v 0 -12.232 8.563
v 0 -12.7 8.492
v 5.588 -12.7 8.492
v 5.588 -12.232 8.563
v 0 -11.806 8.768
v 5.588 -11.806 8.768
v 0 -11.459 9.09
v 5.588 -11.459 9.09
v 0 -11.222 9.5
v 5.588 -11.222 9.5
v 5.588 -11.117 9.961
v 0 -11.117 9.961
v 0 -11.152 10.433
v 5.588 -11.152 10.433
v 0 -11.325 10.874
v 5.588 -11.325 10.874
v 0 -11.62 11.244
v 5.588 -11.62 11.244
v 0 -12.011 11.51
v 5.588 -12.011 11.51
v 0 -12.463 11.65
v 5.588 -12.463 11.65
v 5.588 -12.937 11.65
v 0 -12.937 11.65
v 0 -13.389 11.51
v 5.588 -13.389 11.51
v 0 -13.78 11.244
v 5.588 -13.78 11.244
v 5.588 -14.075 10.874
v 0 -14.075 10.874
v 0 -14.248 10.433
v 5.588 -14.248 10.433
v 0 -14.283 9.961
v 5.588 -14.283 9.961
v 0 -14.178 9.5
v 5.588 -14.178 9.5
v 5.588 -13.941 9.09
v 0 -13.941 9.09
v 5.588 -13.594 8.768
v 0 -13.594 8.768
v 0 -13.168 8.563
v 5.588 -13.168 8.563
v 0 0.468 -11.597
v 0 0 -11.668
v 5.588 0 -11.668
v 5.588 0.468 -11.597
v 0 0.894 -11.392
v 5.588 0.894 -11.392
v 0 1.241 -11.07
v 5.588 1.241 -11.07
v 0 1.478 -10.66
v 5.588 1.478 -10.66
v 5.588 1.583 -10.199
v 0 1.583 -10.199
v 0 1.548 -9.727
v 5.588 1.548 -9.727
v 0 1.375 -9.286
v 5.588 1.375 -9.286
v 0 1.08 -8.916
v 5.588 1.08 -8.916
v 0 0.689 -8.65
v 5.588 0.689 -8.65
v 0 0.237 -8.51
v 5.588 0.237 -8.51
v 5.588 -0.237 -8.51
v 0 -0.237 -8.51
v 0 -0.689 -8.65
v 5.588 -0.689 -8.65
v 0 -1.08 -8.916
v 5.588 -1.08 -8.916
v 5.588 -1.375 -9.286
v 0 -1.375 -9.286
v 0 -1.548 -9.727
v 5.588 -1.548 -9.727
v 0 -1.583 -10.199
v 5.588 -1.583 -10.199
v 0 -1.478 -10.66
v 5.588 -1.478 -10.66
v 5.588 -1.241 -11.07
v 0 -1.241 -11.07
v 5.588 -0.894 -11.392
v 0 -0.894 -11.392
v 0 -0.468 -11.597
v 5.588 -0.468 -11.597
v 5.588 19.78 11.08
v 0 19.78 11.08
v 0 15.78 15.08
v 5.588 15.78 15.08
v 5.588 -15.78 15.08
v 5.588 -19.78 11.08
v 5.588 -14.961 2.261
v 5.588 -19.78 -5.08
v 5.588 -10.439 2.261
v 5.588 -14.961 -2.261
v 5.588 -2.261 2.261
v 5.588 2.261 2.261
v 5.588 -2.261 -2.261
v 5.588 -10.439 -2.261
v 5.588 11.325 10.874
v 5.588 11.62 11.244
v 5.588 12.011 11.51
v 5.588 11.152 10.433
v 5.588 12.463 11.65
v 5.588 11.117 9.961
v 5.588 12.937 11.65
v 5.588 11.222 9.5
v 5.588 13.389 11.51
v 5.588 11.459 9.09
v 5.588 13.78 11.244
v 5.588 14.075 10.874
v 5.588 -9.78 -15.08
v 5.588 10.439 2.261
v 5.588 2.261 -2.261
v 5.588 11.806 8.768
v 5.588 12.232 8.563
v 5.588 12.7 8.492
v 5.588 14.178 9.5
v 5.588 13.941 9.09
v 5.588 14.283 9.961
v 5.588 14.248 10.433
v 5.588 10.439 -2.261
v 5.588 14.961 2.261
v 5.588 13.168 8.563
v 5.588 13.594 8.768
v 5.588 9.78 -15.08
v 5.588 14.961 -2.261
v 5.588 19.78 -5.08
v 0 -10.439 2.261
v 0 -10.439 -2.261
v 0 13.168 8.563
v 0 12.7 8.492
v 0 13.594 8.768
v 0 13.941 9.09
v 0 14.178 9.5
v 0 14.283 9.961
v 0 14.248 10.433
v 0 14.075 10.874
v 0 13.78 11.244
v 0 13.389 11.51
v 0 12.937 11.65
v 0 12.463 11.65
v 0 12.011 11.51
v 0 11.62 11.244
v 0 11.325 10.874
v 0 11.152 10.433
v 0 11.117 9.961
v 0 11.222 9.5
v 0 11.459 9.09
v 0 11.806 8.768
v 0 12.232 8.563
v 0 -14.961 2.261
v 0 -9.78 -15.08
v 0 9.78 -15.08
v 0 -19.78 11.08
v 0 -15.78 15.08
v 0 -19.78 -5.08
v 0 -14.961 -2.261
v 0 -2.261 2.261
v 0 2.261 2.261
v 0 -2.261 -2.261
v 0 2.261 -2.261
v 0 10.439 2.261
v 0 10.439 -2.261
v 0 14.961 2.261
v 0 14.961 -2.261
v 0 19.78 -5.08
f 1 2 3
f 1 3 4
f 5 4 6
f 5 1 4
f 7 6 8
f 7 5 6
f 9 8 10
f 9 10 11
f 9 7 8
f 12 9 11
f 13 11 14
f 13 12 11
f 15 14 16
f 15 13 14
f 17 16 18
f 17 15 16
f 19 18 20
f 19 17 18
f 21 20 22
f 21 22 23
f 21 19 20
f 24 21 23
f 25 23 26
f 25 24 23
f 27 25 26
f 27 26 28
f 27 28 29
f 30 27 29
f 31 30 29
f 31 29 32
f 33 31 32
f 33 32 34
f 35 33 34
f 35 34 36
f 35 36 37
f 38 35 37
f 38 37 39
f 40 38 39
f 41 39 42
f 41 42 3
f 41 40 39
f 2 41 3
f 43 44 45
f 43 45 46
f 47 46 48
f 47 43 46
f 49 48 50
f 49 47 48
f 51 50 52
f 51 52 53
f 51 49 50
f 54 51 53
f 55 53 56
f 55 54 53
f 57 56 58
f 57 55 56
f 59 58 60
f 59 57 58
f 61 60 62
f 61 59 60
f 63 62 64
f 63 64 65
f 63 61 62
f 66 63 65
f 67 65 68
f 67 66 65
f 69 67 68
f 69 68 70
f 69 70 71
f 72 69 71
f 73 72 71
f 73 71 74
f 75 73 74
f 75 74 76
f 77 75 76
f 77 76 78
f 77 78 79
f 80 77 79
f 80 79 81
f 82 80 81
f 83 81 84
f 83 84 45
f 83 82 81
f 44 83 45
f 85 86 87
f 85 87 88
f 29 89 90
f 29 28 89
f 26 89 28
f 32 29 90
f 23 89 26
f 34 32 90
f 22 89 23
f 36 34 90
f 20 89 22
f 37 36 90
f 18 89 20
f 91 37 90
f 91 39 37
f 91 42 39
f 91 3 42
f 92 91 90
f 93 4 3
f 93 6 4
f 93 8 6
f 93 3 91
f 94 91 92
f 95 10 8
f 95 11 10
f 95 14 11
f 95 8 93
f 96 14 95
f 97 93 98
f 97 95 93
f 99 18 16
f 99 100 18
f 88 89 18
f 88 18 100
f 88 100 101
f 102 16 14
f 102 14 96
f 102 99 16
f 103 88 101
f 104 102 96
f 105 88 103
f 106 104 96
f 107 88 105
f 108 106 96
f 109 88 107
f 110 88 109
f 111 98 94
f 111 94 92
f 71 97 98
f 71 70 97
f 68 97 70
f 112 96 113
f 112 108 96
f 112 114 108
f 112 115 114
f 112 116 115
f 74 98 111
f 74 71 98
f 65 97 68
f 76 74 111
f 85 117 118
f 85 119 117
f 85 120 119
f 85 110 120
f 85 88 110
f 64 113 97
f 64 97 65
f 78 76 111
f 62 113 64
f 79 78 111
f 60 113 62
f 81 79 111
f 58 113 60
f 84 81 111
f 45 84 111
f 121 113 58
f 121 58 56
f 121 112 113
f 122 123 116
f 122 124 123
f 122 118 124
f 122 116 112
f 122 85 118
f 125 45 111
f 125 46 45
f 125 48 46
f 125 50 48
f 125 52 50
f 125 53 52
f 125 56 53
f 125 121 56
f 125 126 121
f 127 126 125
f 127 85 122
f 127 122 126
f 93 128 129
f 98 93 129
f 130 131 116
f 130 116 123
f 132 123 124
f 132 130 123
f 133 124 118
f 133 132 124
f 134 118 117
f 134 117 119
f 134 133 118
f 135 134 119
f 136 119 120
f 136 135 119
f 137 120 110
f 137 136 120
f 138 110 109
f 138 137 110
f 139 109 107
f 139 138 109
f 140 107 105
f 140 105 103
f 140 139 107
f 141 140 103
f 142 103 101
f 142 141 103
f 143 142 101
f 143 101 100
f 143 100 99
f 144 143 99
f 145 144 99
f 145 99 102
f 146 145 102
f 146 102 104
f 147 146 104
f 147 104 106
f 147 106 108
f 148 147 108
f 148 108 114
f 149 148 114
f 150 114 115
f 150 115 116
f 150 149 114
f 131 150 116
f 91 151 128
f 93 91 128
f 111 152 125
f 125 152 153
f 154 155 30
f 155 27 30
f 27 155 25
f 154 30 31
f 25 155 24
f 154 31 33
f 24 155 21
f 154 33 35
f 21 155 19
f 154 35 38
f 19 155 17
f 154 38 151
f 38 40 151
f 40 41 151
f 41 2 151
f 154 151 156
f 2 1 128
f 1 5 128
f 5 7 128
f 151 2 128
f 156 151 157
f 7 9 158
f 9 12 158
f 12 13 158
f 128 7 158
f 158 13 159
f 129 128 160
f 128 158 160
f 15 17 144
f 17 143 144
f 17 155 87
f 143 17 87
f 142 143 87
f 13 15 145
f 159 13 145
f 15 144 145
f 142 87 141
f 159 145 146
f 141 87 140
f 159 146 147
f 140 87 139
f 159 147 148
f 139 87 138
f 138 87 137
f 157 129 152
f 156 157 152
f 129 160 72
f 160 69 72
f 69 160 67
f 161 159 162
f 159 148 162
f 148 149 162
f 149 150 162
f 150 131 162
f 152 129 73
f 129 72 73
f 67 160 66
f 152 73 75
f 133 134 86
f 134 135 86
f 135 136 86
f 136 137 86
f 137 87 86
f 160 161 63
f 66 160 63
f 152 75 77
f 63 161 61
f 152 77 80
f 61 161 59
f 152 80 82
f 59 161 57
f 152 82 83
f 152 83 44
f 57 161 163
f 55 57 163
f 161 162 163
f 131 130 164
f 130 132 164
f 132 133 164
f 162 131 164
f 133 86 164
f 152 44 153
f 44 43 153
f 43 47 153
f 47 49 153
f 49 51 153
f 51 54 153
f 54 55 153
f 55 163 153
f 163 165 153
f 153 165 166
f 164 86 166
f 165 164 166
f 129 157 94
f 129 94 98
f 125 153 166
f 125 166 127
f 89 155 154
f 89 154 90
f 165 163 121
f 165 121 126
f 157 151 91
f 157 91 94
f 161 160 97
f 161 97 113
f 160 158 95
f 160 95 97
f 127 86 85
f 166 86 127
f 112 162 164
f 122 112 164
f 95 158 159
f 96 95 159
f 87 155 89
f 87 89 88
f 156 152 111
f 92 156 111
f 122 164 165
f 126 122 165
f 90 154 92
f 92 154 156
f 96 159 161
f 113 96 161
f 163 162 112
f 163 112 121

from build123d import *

# Parameters (mm, degrees)
SKETCH1_W           = 30.16
SKETCH1_H           = 39.56
SKETCH1_R           = 1.5875
SKETCH1_W_2         = 4.521190227
SKETCH1_H_2         = 4.521190227
SKETCH1_W_3         = 4.521190228
SKETCH1_H_3         = 4.521190228
BOSS_EXTRUDE1_DEPTH = 5.588
CHAMFER1_SIZE       = 10
CHAMFER2_SIZE       = 4


with BuildPart() as part:
    # Sketch1 → Boss-Extrude1 (new body)
    with BuildSketch(Plane(origin=(0, 0, 0), x_dir=(0, 0, -1), z_dir=(1, 0, 0))):
        with Locations((4.886e-06, 4.886e-06)):
            Rectangle(SKETCH1_W, SKETCH1_H)
        with Locations((-10.079995114, 12.700004886)):
            Circle(SKETCH1_R, mode=Mode.SUBTRACT)
        with Locations((-10.079995114, -12.699995114)):
            Circle(SKETCH1_R, mode=Mode.SUBTRACT)
        with Locations((10.080004886, 0)):
            Circle(SKETCH1_R, mode=Mode.SUBTRACT)
        with Locations((4.886e-06, 12.700004887)):
            Rectangle(SKETCH1_W_2, SKETCH1_H_2, mode=Mode.SUBTRACT)
        Rectangle(SKETCH1_W_3, SKETCH1_H_3, mode=Mode.SUBTRACT)
        with Locations((4.886e-06, -12.699995114)):
            Rectangle(SKETCH1_W_2, SKETCH1_H_2, mode=Mode.SUBTRACT)
    extrude(amount=BOSS_EXTRUDE1_DEPTH)

    # Chamfer1
    chamfer1_edges = [part.edges().sort_by_distance(p)[0] for p in [
        (2.794, 19.780004886, -15.080004886),
        (2.794, -19.779995114, -15.080004886),
    ]]
    chamfer(chamfer1_edges, length=CHAMFER1_SIZE)

    # Chamfer2
    chamfer2_edges = [part.edges().sort_by_distance(p)[0] for p in [
        (2.794, 19.780004886, 15.079995114),
        (2.794, -19.779995114, 15.079995114),
    ]]
    chamfer(chamfer2_edges, length=CHAMFER2_SIZE)


solid = part.part
